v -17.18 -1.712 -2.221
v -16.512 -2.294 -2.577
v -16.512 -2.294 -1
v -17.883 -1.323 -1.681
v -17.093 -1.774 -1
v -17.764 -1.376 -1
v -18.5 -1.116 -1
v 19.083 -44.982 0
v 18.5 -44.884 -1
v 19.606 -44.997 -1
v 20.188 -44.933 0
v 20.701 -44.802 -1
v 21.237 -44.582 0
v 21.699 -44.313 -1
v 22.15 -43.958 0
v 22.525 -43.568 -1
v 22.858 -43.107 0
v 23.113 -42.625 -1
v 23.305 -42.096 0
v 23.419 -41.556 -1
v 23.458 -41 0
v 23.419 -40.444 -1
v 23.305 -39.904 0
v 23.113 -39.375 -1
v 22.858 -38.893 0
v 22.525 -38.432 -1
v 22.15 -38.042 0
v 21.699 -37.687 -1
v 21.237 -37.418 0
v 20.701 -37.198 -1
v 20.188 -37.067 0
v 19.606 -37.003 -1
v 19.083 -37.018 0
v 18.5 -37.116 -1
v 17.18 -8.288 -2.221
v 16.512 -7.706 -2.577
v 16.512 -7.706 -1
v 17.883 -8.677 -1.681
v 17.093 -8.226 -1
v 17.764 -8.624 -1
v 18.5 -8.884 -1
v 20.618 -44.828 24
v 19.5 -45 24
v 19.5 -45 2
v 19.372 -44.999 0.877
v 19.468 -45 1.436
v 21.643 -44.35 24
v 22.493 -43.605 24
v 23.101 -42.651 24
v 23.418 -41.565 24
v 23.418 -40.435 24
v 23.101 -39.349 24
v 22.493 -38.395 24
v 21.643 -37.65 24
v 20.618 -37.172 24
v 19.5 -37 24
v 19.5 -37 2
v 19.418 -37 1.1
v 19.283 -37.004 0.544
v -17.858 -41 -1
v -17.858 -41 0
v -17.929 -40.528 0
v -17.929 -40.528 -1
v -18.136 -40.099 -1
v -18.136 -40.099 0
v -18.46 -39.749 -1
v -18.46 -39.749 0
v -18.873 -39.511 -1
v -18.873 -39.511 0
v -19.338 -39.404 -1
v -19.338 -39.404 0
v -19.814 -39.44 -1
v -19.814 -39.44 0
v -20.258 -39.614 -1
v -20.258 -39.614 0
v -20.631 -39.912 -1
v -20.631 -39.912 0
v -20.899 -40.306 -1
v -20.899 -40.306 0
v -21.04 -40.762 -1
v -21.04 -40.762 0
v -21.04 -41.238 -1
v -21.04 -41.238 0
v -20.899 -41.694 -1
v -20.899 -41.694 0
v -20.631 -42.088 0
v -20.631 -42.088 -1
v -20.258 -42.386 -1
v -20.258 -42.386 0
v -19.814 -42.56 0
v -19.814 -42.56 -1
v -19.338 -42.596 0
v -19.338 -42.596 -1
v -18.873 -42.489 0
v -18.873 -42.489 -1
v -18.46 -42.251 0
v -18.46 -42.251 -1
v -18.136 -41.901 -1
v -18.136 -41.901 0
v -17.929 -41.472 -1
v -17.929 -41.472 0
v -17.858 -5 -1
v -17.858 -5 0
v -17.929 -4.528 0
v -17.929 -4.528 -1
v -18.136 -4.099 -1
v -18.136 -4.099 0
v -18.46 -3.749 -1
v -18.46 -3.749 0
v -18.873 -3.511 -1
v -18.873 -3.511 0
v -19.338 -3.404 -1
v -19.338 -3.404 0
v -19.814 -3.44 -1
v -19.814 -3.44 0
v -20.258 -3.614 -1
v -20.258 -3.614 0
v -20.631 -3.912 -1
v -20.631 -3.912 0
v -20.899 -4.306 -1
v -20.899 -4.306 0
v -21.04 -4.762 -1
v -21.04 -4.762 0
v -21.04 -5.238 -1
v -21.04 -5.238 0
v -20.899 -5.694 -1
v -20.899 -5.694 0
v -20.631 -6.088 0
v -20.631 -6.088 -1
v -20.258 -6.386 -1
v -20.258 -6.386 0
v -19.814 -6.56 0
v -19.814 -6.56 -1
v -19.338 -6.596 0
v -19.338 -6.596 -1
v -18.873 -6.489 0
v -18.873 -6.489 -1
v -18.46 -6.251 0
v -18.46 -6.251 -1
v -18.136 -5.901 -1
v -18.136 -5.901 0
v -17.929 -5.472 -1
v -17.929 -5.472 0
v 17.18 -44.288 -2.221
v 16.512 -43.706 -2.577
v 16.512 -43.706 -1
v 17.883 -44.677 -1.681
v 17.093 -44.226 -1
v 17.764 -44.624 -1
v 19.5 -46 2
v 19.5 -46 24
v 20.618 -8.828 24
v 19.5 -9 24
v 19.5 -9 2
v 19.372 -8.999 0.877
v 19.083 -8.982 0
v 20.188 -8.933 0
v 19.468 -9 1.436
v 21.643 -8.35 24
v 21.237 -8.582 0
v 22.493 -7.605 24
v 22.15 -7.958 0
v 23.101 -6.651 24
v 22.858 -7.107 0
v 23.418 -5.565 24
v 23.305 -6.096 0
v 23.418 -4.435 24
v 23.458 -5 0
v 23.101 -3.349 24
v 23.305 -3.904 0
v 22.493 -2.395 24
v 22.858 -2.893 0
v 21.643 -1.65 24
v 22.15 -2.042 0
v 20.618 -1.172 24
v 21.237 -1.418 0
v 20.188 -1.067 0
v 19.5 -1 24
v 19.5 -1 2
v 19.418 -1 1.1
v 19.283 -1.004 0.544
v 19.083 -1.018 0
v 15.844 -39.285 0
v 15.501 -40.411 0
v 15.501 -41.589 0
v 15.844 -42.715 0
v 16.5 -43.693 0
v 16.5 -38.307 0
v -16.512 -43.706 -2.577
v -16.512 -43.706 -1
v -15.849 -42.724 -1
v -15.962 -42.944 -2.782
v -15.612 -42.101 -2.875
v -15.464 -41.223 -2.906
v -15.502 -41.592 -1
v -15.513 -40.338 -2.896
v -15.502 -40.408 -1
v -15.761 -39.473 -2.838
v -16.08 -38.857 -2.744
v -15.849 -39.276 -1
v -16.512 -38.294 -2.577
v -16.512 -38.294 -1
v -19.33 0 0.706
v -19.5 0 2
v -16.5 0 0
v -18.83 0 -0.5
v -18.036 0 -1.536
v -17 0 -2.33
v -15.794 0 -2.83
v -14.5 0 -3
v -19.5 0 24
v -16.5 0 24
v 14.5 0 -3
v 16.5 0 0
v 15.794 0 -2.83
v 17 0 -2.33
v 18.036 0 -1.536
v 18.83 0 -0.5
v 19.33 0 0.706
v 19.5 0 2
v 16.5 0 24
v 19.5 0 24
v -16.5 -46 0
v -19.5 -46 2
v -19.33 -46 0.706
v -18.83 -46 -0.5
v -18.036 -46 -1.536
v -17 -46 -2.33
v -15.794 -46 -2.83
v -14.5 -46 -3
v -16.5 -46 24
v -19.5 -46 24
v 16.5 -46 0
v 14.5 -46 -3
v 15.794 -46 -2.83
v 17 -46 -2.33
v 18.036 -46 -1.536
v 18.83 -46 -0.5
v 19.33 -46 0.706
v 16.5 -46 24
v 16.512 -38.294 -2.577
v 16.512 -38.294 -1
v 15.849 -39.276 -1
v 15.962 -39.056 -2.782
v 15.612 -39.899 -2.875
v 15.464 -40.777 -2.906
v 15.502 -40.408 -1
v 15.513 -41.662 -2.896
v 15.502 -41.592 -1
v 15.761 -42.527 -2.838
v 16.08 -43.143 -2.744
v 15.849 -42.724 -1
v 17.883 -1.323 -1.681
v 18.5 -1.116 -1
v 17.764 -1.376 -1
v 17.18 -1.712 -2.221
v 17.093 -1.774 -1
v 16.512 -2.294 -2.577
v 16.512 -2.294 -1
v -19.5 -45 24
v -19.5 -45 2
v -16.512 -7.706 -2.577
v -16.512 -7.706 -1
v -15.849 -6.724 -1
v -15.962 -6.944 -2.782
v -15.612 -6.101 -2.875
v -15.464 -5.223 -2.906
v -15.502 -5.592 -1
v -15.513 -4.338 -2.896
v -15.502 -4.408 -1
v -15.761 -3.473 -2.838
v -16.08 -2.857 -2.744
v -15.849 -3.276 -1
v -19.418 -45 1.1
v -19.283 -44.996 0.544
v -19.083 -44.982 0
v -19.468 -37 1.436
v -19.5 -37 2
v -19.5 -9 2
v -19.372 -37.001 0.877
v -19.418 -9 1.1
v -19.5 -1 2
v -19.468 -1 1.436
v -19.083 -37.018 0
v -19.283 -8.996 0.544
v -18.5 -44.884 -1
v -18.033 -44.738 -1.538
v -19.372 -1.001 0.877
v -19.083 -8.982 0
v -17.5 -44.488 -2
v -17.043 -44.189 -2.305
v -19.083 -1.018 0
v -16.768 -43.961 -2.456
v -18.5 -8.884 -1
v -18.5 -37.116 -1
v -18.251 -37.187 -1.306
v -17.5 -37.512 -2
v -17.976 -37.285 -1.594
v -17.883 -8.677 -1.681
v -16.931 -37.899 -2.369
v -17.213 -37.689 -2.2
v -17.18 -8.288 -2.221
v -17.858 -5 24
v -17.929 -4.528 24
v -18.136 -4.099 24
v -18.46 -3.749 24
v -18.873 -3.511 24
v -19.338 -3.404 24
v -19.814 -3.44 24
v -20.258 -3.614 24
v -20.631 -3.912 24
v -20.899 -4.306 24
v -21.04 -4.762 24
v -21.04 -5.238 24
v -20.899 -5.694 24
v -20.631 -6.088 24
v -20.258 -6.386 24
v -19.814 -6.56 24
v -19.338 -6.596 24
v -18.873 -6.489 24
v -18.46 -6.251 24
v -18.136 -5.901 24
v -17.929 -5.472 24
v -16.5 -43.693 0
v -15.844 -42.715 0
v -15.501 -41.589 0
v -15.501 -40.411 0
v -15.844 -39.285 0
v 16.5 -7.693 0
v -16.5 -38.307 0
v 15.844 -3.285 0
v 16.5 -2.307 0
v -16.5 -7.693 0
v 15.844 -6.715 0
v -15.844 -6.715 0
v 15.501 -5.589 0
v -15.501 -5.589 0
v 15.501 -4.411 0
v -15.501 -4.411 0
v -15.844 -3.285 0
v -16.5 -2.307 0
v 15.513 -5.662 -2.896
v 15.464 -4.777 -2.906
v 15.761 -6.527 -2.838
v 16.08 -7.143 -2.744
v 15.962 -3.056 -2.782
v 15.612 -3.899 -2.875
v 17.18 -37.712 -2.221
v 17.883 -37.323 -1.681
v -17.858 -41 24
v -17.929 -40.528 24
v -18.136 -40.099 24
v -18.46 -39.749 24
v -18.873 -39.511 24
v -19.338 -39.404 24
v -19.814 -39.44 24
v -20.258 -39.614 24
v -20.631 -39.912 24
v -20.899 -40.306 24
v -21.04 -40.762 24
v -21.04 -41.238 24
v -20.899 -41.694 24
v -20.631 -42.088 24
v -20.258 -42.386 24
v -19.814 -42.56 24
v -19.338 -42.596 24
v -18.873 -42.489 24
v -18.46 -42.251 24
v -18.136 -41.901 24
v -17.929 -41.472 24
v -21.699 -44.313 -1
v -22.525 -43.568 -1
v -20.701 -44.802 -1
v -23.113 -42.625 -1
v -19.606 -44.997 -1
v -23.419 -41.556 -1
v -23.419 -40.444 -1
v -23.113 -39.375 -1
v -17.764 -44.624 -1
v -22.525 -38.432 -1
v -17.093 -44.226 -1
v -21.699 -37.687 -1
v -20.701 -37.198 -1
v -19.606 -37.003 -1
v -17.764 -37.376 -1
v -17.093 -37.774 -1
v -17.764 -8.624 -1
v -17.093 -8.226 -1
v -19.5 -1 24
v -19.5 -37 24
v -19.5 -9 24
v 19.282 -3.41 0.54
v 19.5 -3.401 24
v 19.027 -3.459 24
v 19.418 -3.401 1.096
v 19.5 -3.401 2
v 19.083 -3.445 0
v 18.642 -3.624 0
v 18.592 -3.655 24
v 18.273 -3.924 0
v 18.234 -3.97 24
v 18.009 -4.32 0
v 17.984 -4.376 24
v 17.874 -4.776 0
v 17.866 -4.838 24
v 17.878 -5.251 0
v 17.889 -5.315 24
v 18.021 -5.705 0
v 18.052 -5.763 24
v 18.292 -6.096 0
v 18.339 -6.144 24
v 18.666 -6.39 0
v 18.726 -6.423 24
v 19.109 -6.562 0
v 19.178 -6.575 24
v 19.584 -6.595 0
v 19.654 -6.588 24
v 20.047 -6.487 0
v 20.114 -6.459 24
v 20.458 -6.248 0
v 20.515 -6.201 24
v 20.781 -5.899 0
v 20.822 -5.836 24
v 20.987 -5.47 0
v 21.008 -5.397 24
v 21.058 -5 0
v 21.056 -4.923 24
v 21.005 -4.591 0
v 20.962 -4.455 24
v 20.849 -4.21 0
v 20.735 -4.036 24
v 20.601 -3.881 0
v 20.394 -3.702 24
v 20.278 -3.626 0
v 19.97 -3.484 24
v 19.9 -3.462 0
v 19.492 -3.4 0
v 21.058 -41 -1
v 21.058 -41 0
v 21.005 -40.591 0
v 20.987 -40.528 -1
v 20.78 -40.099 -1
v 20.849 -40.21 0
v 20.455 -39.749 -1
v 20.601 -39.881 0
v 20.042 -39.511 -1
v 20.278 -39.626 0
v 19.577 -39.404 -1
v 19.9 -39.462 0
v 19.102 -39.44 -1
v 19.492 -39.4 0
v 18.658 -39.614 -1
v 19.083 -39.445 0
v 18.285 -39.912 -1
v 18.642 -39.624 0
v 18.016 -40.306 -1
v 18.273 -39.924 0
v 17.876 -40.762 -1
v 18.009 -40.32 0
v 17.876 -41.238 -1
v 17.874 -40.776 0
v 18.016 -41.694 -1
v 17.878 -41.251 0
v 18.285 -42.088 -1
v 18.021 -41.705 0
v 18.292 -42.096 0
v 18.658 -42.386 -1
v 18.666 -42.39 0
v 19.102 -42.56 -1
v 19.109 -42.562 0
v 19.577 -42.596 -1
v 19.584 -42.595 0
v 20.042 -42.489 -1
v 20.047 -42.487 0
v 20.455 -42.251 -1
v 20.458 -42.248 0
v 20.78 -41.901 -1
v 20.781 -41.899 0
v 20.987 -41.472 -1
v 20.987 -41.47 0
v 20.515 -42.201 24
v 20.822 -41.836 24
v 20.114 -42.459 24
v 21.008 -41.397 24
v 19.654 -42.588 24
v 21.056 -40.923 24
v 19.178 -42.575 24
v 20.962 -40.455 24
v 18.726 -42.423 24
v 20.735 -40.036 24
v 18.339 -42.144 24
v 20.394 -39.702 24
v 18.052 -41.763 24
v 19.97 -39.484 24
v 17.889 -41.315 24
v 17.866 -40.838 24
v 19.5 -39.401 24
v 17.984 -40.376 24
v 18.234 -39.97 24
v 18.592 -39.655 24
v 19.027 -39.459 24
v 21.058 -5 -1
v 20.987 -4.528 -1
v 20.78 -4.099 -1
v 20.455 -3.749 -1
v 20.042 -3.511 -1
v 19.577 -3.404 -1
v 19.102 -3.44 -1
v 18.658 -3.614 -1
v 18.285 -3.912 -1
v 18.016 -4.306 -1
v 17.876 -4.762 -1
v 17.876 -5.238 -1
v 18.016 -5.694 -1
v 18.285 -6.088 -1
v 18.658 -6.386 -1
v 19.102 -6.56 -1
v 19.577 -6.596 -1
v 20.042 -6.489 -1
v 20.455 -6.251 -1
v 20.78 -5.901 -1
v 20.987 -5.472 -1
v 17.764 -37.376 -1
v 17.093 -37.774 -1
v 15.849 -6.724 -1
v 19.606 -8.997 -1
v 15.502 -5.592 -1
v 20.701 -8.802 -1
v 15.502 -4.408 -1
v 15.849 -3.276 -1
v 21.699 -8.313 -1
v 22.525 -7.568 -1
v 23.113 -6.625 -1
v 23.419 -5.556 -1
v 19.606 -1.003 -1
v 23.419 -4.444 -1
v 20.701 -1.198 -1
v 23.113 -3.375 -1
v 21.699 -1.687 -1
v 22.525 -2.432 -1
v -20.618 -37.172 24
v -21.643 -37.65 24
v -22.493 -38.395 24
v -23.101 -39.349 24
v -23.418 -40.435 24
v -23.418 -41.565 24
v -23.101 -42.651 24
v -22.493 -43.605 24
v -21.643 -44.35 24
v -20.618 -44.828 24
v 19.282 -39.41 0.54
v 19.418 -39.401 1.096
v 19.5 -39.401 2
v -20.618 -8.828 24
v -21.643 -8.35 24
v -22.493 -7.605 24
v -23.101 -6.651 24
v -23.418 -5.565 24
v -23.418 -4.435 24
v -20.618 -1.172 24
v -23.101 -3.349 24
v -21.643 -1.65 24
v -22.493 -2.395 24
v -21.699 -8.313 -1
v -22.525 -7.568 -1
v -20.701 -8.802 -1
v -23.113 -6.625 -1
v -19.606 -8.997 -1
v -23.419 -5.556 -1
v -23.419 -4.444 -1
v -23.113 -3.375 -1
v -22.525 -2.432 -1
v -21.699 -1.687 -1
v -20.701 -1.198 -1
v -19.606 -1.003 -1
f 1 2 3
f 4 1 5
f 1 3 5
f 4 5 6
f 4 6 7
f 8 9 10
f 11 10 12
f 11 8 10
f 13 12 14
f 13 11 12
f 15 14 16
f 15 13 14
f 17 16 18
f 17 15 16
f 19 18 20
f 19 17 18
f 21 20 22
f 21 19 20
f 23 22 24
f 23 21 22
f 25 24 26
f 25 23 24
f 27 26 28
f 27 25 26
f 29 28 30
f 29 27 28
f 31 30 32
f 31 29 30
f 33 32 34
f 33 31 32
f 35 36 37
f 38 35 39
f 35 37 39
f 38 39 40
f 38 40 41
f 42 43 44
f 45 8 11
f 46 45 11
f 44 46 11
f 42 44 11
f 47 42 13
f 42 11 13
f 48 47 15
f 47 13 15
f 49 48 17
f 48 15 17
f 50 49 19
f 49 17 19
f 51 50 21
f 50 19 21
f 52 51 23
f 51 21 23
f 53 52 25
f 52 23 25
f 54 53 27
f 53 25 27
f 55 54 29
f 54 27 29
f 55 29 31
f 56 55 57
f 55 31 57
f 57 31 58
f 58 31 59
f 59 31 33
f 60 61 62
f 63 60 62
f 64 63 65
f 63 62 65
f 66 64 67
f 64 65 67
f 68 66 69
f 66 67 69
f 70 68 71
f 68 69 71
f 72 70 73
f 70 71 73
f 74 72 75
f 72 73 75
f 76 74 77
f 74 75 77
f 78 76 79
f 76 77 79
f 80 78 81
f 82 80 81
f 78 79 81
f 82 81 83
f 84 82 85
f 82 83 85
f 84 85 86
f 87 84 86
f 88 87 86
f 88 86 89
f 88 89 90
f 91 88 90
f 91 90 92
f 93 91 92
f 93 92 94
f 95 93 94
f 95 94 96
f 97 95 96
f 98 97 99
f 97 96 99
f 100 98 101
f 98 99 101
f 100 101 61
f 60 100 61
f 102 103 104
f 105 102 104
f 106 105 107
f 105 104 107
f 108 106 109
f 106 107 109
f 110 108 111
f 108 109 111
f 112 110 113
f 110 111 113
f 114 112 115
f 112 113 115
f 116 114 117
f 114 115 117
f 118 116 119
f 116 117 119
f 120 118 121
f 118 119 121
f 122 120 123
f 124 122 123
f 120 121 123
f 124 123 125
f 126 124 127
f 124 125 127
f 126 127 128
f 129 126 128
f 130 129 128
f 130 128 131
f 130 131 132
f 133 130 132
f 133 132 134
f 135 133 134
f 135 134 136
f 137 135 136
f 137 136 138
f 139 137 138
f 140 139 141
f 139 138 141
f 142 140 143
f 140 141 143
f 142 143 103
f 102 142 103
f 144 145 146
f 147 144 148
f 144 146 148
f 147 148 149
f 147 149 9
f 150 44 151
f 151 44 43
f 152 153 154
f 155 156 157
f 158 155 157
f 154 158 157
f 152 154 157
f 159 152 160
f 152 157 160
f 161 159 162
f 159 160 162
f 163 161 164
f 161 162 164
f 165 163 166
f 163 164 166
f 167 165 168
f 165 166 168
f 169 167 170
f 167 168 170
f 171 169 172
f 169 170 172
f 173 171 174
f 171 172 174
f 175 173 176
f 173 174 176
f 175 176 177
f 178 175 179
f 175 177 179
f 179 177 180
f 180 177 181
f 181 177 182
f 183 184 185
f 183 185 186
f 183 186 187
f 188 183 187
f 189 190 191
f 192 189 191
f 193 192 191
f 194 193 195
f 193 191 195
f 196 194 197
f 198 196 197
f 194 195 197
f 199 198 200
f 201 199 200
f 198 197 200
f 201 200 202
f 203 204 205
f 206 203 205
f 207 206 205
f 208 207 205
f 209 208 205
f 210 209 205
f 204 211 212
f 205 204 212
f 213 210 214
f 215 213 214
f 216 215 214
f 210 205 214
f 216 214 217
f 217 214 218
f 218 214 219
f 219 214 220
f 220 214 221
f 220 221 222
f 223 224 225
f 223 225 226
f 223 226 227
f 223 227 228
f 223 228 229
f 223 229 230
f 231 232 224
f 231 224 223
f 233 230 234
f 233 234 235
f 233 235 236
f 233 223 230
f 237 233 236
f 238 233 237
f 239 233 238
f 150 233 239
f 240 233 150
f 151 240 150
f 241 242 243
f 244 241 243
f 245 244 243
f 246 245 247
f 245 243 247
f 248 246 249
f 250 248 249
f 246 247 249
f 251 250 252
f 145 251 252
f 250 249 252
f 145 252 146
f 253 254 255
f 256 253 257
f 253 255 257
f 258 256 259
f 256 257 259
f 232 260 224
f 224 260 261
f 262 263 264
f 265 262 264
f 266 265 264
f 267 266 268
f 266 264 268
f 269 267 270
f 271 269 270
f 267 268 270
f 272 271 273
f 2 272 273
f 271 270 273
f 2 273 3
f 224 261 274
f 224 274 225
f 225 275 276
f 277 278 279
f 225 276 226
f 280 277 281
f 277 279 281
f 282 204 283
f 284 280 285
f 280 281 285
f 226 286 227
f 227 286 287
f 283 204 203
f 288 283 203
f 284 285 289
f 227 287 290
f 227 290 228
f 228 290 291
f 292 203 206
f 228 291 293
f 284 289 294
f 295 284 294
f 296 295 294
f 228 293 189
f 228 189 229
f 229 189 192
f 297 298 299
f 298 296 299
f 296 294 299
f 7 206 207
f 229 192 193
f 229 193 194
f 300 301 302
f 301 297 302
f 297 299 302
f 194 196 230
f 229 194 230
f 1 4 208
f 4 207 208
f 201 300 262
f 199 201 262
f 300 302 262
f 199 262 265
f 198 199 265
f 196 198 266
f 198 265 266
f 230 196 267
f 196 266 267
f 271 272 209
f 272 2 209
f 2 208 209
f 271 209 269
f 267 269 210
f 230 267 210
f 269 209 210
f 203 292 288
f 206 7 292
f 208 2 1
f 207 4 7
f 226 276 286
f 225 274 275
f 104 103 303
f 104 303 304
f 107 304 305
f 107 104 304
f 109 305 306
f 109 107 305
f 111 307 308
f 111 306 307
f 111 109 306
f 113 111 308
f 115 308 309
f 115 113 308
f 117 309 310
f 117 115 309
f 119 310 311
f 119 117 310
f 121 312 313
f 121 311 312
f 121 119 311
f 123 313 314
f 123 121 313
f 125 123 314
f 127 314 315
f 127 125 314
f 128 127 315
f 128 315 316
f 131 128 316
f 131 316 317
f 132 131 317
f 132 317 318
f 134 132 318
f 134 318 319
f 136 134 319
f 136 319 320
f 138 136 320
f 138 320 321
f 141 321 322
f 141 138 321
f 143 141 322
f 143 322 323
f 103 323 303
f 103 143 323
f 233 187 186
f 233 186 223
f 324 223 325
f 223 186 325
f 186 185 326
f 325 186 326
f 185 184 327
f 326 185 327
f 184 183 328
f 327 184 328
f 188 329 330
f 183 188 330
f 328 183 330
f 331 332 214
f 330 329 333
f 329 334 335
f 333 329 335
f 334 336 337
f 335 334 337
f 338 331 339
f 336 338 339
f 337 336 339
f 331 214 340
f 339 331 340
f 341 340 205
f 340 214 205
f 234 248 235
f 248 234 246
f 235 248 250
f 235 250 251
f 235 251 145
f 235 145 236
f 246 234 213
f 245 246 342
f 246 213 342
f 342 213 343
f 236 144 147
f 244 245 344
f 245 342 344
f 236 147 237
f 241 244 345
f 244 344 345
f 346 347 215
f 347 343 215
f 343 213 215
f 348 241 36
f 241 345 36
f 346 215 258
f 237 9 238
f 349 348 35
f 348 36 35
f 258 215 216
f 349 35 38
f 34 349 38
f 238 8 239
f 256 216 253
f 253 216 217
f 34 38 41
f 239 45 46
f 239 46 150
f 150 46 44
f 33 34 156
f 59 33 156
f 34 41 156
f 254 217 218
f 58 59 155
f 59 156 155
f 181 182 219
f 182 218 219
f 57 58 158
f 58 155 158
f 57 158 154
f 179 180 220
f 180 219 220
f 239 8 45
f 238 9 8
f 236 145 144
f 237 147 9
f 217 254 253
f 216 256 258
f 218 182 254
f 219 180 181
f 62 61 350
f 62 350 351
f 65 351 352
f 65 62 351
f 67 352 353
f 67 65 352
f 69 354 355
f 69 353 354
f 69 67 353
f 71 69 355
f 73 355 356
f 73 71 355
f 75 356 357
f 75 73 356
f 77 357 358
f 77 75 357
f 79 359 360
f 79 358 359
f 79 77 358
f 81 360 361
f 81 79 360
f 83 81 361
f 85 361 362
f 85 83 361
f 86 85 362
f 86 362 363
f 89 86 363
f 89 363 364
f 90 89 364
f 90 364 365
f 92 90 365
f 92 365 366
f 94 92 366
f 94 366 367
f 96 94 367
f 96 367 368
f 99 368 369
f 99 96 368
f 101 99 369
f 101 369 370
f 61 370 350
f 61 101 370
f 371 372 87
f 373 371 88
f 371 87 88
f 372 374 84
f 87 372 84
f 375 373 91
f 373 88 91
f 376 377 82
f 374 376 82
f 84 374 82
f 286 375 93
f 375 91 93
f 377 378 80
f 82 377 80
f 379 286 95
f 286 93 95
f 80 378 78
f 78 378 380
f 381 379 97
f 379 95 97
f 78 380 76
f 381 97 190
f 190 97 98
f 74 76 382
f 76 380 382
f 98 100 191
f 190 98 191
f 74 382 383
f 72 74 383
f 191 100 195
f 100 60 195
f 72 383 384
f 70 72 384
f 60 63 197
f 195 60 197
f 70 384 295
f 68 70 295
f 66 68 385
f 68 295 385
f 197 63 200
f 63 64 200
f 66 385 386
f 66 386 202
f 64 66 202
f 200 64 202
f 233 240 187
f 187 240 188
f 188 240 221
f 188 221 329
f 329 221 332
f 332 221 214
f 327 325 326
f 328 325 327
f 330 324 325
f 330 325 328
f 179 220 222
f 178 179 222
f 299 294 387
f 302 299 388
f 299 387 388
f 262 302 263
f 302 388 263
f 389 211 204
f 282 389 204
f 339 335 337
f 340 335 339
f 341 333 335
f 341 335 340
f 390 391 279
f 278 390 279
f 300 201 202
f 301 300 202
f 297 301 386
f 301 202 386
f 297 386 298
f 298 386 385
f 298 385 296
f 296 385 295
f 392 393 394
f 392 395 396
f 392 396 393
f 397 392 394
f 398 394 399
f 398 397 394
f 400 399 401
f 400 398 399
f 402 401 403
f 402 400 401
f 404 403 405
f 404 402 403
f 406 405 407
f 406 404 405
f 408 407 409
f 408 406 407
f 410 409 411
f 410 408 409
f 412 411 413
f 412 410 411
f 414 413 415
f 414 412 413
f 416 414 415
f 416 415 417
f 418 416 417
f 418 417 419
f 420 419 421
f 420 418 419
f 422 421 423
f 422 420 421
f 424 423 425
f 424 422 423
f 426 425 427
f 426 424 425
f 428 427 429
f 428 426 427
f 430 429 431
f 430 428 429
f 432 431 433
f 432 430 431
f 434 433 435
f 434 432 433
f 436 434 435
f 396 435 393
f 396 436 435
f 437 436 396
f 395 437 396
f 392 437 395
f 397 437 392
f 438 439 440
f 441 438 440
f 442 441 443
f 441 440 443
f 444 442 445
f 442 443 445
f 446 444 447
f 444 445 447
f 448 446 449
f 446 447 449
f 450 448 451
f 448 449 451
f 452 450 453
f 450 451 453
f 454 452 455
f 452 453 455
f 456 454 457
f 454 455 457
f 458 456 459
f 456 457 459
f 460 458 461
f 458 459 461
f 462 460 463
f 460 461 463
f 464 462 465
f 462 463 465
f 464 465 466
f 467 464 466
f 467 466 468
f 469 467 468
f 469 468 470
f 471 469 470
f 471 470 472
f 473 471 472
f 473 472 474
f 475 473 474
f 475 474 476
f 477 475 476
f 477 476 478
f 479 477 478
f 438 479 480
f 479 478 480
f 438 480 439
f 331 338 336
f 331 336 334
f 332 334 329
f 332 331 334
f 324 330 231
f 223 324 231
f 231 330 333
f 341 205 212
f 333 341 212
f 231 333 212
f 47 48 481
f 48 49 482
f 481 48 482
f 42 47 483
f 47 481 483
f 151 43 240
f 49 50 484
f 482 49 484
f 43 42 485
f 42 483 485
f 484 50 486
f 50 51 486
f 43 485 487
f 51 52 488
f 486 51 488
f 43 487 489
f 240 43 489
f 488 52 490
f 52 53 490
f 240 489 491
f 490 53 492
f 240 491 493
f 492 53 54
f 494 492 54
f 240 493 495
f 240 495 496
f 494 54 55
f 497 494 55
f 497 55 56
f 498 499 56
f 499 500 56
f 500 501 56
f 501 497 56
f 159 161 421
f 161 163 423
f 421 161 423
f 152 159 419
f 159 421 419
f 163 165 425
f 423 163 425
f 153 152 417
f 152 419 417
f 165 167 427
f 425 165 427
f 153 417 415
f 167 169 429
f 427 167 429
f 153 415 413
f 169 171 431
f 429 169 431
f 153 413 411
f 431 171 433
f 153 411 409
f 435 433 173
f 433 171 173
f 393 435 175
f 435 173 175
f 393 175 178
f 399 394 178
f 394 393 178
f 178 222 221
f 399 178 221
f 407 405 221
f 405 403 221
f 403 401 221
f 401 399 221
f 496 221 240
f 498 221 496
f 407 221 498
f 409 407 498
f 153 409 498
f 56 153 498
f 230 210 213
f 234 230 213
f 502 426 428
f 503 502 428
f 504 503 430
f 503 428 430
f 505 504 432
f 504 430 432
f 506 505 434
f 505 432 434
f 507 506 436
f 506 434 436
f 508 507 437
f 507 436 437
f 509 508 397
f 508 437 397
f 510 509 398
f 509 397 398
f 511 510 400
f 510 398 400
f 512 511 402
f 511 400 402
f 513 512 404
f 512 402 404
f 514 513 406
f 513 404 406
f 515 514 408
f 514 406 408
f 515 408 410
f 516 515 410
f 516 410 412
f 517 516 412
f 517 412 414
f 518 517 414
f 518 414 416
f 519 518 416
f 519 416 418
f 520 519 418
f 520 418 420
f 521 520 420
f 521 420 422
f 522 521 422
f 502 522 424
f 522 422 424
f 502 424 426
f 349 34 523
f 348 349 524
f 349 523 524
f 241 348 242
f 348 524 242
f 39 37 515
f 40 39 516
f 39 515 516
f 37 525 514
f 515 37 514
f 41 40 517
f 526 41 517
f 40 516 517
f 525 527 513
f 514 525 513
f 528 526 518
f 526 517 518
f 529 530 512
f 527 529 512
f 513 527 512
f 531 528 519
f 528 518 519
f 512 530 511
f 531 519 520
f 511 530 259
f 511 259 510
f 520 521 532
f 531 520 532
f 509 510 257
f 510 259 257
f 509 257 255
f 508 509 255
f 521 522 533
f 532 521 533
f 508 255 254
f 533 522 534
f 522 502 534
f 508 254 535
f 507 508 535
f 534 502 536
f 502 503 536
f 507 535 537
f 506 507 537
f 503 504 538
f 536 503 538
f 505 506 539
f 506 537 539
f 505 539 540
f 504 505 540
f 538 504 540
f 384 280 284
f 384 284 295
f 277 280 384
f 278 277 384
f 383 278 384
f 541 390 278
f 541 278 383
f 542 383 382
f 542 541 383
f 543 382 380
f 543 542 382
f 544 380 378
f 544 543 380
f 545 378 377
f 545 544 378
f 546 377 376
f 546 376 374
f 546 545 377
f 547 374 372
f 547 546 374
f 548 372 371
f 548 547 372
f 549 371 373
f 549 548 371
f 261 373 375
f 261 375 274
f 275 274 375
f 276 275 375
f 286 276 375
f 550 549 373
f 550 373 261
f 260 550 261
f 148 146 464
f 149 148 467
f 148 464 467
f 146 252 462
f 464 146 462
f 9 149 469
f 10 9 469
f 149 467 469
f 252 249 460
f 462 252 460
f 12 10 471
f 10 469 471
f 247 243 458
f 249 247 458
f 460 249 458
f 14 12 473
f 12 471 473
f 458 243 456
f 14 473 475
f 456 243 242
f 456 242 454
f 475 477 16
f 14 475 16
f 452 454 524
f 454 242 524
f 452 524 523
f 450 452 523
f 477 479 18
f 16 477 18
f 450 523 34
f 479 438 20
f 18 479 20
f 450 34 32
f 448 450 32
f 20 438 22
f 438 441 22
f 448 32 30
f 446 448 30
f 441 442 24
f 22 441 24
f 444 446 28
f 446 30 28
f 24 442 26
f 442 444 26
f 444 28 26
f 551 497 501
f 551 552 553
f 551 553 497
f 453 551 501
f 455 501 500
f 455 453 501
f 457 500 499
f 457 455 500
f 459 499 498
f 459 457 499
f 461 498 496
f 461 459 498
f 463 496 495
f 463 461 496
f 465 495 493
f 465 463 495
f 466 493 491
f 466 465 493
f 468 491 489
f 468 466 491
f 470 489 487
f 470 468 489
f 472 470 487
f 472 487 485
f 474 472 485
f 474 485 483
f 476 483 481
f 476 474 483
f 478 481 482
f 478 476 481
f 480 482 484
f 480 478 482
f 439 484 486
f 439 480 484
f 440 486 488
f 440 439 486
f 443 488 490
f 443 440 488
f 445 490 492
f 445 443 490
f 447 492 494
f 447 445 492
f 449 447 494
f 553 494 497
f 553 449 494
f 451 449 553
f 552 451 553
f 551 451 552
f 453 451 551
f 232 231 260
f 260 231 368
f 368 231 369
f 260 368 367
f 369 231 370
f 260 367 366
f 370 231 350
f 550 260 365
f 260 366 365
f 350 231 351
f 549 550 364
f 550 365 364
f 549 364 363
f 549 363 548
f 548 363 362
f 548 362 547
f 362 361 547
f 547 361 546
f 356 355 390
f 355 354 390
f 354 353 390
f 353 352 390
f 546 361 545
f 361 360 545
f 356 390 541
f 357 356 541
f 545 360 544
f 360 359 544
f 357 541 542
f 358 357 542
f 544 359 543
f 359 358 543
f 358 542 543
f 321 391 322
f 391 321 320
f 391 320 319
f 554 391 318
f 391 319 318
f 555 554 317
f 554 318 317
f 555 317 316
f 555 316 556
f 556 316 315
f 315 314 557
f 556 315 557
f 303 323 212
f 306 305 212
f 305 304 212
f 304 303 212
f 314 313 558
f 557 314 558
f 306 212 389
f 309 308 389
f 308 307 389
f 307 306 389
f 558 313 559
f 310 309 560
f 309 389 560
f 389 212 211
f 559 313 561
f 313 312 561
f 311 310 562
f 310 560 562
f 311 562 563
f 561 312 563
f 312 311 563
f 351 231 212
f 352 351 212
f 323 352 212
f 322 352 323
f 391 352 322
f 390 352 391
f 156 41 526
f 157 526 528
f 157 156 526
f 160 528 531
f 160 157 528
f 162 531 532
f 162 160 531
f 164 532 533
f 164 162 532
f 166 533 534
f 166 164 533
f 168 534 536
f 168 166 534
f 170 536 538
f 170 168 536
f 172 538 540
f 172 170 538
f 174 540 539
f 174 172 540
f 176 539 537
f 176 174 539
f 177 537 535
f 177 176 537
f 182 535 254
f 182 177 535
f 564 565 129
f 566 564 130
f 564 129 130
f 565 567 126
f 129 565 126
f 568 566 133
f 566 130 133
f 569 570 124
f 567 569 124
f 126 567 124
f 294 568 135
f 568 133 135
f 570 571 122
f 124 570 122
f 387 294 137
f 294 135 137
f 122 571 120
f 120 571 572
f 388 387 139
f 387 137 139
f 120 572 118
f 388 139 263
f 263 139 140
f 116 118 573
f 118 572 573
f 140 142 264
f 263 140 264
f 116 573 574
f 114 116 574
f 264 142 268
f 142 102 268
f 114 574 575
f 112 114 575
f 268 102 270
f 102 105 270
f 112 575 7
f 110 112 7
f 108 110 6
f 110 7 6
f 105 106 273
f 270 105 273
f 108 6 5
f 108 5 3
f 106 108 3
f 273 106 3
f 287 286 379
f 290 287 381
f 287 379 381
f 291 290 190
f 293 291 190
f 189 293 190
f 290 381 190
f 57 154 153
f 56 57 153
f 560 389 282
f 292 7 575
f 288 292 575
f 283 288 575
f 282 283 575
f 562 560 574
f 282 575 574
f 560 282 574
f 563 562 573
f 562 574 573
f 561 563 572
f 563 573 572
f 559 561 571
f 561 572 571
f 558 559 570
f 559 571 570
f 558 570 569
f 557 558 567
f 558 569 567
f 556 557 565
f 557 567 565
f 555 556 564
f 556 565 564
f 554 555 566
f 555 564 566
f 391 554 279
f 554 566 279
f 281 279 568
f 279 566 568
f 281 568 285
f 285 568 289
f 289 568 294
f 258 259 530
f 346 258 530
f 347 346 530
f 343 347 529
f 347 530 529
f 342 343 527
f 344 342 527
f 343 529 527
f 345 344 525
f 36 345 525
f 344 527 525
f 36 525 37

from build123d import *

# Parameters (mm, degrees)
F1_DEPTH      = 46
F3_R          = 1.6
F4_DEPTH      = 24
F5_DEPTH      = 24.001
F5_DEPTH_BACK = 3.001
F6_DEPTH      = 25
F7_DEPTH      = 2
F8_DEPTH      = 25
F9_DEPTH      = 1


with BuildPart() as f1:
    # F0 (on Front) → F1 (new body)
    with BuildSketch(Plane.XZ):
        with BuildLine():
            Line((16.5, 0), (-16.5, 0))
            Line((-16.5, 0), (-16.5, 21))
            Line((-16.5, 21), (-16.5, 24))
            Line((-16.5, 24), (-19.5, 24))
            Line((-19.5, 24), (-19.5, 2))
            ThreePointArc((-19.5, 2), (-18.035534, -1.535534), (-14.5, -3))
            Line((-14.5, -3), (14.5, -3))
            ThreePointArc((14.5, -3), (18.035534, -1.535534), (19.5, 2))
            Line((19.5, 2), (19.5, 24))
            Line((19.5, 24), (16.5, 24))
            Line((16.5, 24), (16.5, 21))
            Line((16.5, 21), (16.5, 0))
        make_face()
    extrude(amount=F1_DEPTH)

    # F3 (on Top) → F4 (join, through all)
    with BuildSketch(Plane.XY):
        with BuildLine():
            ThreePointArc((-16.511744, -2.294334), (-23.457821, -5), (-16.511744, -7.705666))
            Line((-16.511744, -7.705666), (-16.511744, -2.294334))
        make_face()
        with Locations((-19.457821, -5)):
            Circle(F3_R, mode=Mode.SUBTRACT)
        with BuildLine():
            Line((16.511744, -2.294334), (16.511744, -7.705666))
            ThreePointArc((16.511744, -7.705666), (23.457821, -5), (16.511744, -2.294334))
        make_face()
        with Locations((19.457821, -5)):
            Circle(F3_R, mode=Mode.SUBTRACT)
        with BuildLine():
            Line((16.511744, -38.294334), (16.511744, -43.705666))
            ThreePointArc((16.511744, -43.705666), (23.457821, -41), (16.511744, -38.294334))
        make_face()
        with Locations((19.457821, -41)):
            Circle(F3_R, mode=Mode.SUBTRACT)
        with BuildLine():
            ThreePointArc((-16.511744, -38.294334), (-23.457821, -41), (-16.511744, -43.705666))
            Line((-16.511744, -43.705666), (-16.511744, -38.294334))
        make_face()
        with Locations((-19.457821, -41)):
            Circle(F3_R, mode=Mode.SUBTRACT)
    extrude(amount=F4_DEPTH)

    # F3 (on Top) → F5 (cut, two sides)
    with BuildSketch(Plane.XY) as f5_sk:
        with Locations((19.457821, -5)):
            Circle(F3_R)
        with Locations((-19.457821, -5)):
            Circle(F3_R)
        with Locations((-19.457821, -41)):
            Circle(F3_R)
        with Locations((19.457821, -41)):
            Circle(F3_R)
    extrude(amount=F5_DEPTH, mode=Mode.SUBTRACT)
    extrude(f5_sk.sketch, amount=-F5_DEPTH_BACK, mode=Mode.SUBTRACT)

    # F3 (on Top) → F6 (cut)
    with BuildSketch(Plane.XY):
        with BuildLine():
            Line((16.511744, -2.294334), (16.511744, -7.705666))
            ThreePointArc((16.511744, -7.705666), (23.457821, -5), (16.511744, -2.294334))
        make_face()
        with Locations((19.457821, -5)):
            Circle(F3_R, mode=Mode.SUBTRACT)
        with BuildLine():
            ThreePointArc((-16.511744, -2.294334), (-23.457821, -5), (-16.511744, -7.705666))
            Line((-16.511744, -7.705666), (-16.511744, -2.294334))
        make_face()
        with Locations((-19.457821, -5)):
            Circle(F3_R, mode=Mode.SUBTRACT)
        with BuildLine():
            Line((16.511744, -38.294334), (16.511744, -43.705666))
            ThreePointArc((16.511744, -43.705666), (23.457821, -41), (16.511744, -38.294334))
        make_face()
        with Locations((19.457821, -41)):
            Circle(F3_R, mode=Mode.SUBTRACT)
    extrude(amount=-F6_DEPTH, mode=Mode.SUBTRACT)

    # F3 (on Top) → F7 (join)
    with BuildSketch(Plane.XY):
        with BuildLine():
            ThreePointArc((-16.511744, -38.294334), (-23.457821, -41), (-16.511744, -43.705666))
            Line((-16.511744, -43.705666), (-16.511744, -38.294334))
        make_face()
        with Locations((-19.457821, -41)):
            Circle(F3_R, mode=Mode.SUBTRACT)
        with BuildLine():
            ThreePointArc((-16.511744, -2.294334), (-23.457821, -5), (-16.511744, -7.705666))
            Line((-16.511744, -7.705666), (-16.511744, -2.294334))
        make_face()
        with Locations((-19.457821, -5)):
            Circle(F3_R, mode=Mode.SUBTRACT)
        with BuildLine():
            Line((16.511744, -38.294334), (16.511744, -43.705666))
            ThreePointArc((16.511744, -43.705666), (23.457821, -41), (16.511744, -38.294334))
        make_face()
        with Locations((19.457821, -41)):
            Circle(F3_R, mode=Mode.SUBTRACT)
        with BuildLine():
            Line((16.511744, -2.294334), (16.511744, -7.705666))
            ThreePointArc((16.511744, -7.705666), (23.457821, -5), (16.511744, -2.294334))
        make_face()
        with Locations((19.457821, -5)):
            Circle(F3_R, mode=Mode.SUBTRACT)
    extrude(amount=-F7_DEPTH)

    # F3 (on Top) → F8 (cut)
    with BuildSketch(Plane.XY):
        with BuildLine():
            Line((16.511744, -2.294334), (16.511744, -7.705666))
            ThreePointArc((16.511744, -7.705666), (23.457821, -5), (16.511744, -2.294334))
        make_face()
        with Locations((19.457821, -5)):
            Circle(F3_R, mode=Mode.SUBTRACT)
        with BuildLine():
            ThreePointArc((16.511744, -2.294334), (15.457821, -5), (16.511744, -7.705666))
            Line((16.511744, -7.705666), (16.511744, -2.294334))
        make_face()
        with BuildLine():
            Line((16.511744, -38.294334), (16.511744, -43.705666))
            ThreePointArc((16.511744, -43.705666), (23.457821, -41), (16.511744, -38.294334))
        make_face()
        with Locations((19.457821, -41)):
            Circle(F3_R, mode=Mode.SUBTRACT)
        with BuildLine():
            ThreePointArc((16.511744, -38.294334), (15.457821, -41), (16.511744, -43.705666))
            Line((16.511744, -43.705666), (16.511744, -38.294334))
        make_face()
        with BuildLine():
            ThreePointArc((-16.511744, -2.294334), (-23.457821, -5), (-16.511744, -7.705666))
            Line((-16.511744, -7.705666), (-16.511744, -2.294334))
        make_face()
        with Locations((-19.457821, -5)):
            Circle(F3_R, mode=Mode.SUBTRACT)
        with BuildLine():
            Line((-16.511744, -2.294334), (-16.511744, -7.705666))
            ThreePointArc((-16.511744, -7.705666), (-15.457821, -5), (-16.511744, -2.294334))
        make_face()
        with BuildLine():
            ThreePointArc((-16.511744, -38.294334), (-23.457821, -41), (-16.511744, -43.705666))
            Line((-16.511744, -43.705666), (-16.511744, -38.294334))
        make_face()
        with Locations((-19.457821, -41)):
            Circle(F3_R, mode=Mode.SUBTRACT)
        with BuildLine():
            Line((-16.511744, -38.294334), (-16.511744, -43.705666))
            ThreePointArc((-16.511744, -43.705666), (-15.457821, -41), (-16.511744, -38.294334))
        make_face()
    extrude(amount=-F8_DEPTH, mode=Mode.SUBTRACT)

    # F3 (on Top) → F9 (join)
    with BuildSketch(Plane.XY):
        with BuildLine():
            Line((-16.511744, -38.294334), (-16.511744, -43.705666))
            ThreePointArc((-16.511744, -43.705666), (-15.457821, -41), (-16.511744, -38.294334))
        make_face()
        with BuildLine():
            ThreePointArc((-16.511744, -38.294334), (-23.457821, -41), (-16.511744, -43.705666))
            Line((-16.511744, -43.705666), (-16.511744, -38.294334))
        make_face()
        with Locations((-19.457821, -41)):
            Circle(F3_R, mode=Mode.SUBTRACT)
        with BuildLine():
            ThreePointArc((16.511744, -38.294334), (15.457821, -41), (16.511744, -43.705666))
            Line((16.511744, -43.705666), (16.511744, -38.294334))
        make_face()
        with BuildLine():
            Line((16.511744, -38.294334), (16.511744, -43.705666))
            ThreePointArc((16.511744, -43.705666), (23.457821, -41), (16.511744, -38.294334))
        make_face()
        with Locations((19.457821, -41)):
            Circle(F3_R, mode=Mode.SUBTRACT)
        with BuildLine():
            ThreePointArc((16.511744, -2.294334), (15.457821, -5), (16.511744, -7.705666))
            Line((16.511744, -7.705666), (16.511744, -2.294334))
        make_face()
        with BuildLine():
            Line((16.511744, -2.294334), (16.511744, -7.705666))
            ThreePointArc((16.511744, -7.705666), (23.457821, -5), (16.511744, -2.294334))
        make_face()
        with Locations((19.457821, -5)):
            Circle(F3_R, mode=Mode.SUBTRACT)
        with BuildLine():
            Line((-16.511744, -2.294334), (-16.511744, -7.705666))
            ThreePointArc((-16.511744, -7.705666), (-15.457821, -5), (-16.511744, -2.294334))
        make_face()
        with BuildLine():
            ThreePointArc((-16.511744, -2.294334), (-23.457821, -5), (-16.511744, -7.705666))
            Line((-16.511744, -7.705666), (-16.511744, -2.294334))
        make_face()
        with Locations((-19.457821, -5)):
            Circle(F3_R, mode=Mode.SUBTRACT)
    extrude(amount=-F9_DEPTH)


solid = f1.part
